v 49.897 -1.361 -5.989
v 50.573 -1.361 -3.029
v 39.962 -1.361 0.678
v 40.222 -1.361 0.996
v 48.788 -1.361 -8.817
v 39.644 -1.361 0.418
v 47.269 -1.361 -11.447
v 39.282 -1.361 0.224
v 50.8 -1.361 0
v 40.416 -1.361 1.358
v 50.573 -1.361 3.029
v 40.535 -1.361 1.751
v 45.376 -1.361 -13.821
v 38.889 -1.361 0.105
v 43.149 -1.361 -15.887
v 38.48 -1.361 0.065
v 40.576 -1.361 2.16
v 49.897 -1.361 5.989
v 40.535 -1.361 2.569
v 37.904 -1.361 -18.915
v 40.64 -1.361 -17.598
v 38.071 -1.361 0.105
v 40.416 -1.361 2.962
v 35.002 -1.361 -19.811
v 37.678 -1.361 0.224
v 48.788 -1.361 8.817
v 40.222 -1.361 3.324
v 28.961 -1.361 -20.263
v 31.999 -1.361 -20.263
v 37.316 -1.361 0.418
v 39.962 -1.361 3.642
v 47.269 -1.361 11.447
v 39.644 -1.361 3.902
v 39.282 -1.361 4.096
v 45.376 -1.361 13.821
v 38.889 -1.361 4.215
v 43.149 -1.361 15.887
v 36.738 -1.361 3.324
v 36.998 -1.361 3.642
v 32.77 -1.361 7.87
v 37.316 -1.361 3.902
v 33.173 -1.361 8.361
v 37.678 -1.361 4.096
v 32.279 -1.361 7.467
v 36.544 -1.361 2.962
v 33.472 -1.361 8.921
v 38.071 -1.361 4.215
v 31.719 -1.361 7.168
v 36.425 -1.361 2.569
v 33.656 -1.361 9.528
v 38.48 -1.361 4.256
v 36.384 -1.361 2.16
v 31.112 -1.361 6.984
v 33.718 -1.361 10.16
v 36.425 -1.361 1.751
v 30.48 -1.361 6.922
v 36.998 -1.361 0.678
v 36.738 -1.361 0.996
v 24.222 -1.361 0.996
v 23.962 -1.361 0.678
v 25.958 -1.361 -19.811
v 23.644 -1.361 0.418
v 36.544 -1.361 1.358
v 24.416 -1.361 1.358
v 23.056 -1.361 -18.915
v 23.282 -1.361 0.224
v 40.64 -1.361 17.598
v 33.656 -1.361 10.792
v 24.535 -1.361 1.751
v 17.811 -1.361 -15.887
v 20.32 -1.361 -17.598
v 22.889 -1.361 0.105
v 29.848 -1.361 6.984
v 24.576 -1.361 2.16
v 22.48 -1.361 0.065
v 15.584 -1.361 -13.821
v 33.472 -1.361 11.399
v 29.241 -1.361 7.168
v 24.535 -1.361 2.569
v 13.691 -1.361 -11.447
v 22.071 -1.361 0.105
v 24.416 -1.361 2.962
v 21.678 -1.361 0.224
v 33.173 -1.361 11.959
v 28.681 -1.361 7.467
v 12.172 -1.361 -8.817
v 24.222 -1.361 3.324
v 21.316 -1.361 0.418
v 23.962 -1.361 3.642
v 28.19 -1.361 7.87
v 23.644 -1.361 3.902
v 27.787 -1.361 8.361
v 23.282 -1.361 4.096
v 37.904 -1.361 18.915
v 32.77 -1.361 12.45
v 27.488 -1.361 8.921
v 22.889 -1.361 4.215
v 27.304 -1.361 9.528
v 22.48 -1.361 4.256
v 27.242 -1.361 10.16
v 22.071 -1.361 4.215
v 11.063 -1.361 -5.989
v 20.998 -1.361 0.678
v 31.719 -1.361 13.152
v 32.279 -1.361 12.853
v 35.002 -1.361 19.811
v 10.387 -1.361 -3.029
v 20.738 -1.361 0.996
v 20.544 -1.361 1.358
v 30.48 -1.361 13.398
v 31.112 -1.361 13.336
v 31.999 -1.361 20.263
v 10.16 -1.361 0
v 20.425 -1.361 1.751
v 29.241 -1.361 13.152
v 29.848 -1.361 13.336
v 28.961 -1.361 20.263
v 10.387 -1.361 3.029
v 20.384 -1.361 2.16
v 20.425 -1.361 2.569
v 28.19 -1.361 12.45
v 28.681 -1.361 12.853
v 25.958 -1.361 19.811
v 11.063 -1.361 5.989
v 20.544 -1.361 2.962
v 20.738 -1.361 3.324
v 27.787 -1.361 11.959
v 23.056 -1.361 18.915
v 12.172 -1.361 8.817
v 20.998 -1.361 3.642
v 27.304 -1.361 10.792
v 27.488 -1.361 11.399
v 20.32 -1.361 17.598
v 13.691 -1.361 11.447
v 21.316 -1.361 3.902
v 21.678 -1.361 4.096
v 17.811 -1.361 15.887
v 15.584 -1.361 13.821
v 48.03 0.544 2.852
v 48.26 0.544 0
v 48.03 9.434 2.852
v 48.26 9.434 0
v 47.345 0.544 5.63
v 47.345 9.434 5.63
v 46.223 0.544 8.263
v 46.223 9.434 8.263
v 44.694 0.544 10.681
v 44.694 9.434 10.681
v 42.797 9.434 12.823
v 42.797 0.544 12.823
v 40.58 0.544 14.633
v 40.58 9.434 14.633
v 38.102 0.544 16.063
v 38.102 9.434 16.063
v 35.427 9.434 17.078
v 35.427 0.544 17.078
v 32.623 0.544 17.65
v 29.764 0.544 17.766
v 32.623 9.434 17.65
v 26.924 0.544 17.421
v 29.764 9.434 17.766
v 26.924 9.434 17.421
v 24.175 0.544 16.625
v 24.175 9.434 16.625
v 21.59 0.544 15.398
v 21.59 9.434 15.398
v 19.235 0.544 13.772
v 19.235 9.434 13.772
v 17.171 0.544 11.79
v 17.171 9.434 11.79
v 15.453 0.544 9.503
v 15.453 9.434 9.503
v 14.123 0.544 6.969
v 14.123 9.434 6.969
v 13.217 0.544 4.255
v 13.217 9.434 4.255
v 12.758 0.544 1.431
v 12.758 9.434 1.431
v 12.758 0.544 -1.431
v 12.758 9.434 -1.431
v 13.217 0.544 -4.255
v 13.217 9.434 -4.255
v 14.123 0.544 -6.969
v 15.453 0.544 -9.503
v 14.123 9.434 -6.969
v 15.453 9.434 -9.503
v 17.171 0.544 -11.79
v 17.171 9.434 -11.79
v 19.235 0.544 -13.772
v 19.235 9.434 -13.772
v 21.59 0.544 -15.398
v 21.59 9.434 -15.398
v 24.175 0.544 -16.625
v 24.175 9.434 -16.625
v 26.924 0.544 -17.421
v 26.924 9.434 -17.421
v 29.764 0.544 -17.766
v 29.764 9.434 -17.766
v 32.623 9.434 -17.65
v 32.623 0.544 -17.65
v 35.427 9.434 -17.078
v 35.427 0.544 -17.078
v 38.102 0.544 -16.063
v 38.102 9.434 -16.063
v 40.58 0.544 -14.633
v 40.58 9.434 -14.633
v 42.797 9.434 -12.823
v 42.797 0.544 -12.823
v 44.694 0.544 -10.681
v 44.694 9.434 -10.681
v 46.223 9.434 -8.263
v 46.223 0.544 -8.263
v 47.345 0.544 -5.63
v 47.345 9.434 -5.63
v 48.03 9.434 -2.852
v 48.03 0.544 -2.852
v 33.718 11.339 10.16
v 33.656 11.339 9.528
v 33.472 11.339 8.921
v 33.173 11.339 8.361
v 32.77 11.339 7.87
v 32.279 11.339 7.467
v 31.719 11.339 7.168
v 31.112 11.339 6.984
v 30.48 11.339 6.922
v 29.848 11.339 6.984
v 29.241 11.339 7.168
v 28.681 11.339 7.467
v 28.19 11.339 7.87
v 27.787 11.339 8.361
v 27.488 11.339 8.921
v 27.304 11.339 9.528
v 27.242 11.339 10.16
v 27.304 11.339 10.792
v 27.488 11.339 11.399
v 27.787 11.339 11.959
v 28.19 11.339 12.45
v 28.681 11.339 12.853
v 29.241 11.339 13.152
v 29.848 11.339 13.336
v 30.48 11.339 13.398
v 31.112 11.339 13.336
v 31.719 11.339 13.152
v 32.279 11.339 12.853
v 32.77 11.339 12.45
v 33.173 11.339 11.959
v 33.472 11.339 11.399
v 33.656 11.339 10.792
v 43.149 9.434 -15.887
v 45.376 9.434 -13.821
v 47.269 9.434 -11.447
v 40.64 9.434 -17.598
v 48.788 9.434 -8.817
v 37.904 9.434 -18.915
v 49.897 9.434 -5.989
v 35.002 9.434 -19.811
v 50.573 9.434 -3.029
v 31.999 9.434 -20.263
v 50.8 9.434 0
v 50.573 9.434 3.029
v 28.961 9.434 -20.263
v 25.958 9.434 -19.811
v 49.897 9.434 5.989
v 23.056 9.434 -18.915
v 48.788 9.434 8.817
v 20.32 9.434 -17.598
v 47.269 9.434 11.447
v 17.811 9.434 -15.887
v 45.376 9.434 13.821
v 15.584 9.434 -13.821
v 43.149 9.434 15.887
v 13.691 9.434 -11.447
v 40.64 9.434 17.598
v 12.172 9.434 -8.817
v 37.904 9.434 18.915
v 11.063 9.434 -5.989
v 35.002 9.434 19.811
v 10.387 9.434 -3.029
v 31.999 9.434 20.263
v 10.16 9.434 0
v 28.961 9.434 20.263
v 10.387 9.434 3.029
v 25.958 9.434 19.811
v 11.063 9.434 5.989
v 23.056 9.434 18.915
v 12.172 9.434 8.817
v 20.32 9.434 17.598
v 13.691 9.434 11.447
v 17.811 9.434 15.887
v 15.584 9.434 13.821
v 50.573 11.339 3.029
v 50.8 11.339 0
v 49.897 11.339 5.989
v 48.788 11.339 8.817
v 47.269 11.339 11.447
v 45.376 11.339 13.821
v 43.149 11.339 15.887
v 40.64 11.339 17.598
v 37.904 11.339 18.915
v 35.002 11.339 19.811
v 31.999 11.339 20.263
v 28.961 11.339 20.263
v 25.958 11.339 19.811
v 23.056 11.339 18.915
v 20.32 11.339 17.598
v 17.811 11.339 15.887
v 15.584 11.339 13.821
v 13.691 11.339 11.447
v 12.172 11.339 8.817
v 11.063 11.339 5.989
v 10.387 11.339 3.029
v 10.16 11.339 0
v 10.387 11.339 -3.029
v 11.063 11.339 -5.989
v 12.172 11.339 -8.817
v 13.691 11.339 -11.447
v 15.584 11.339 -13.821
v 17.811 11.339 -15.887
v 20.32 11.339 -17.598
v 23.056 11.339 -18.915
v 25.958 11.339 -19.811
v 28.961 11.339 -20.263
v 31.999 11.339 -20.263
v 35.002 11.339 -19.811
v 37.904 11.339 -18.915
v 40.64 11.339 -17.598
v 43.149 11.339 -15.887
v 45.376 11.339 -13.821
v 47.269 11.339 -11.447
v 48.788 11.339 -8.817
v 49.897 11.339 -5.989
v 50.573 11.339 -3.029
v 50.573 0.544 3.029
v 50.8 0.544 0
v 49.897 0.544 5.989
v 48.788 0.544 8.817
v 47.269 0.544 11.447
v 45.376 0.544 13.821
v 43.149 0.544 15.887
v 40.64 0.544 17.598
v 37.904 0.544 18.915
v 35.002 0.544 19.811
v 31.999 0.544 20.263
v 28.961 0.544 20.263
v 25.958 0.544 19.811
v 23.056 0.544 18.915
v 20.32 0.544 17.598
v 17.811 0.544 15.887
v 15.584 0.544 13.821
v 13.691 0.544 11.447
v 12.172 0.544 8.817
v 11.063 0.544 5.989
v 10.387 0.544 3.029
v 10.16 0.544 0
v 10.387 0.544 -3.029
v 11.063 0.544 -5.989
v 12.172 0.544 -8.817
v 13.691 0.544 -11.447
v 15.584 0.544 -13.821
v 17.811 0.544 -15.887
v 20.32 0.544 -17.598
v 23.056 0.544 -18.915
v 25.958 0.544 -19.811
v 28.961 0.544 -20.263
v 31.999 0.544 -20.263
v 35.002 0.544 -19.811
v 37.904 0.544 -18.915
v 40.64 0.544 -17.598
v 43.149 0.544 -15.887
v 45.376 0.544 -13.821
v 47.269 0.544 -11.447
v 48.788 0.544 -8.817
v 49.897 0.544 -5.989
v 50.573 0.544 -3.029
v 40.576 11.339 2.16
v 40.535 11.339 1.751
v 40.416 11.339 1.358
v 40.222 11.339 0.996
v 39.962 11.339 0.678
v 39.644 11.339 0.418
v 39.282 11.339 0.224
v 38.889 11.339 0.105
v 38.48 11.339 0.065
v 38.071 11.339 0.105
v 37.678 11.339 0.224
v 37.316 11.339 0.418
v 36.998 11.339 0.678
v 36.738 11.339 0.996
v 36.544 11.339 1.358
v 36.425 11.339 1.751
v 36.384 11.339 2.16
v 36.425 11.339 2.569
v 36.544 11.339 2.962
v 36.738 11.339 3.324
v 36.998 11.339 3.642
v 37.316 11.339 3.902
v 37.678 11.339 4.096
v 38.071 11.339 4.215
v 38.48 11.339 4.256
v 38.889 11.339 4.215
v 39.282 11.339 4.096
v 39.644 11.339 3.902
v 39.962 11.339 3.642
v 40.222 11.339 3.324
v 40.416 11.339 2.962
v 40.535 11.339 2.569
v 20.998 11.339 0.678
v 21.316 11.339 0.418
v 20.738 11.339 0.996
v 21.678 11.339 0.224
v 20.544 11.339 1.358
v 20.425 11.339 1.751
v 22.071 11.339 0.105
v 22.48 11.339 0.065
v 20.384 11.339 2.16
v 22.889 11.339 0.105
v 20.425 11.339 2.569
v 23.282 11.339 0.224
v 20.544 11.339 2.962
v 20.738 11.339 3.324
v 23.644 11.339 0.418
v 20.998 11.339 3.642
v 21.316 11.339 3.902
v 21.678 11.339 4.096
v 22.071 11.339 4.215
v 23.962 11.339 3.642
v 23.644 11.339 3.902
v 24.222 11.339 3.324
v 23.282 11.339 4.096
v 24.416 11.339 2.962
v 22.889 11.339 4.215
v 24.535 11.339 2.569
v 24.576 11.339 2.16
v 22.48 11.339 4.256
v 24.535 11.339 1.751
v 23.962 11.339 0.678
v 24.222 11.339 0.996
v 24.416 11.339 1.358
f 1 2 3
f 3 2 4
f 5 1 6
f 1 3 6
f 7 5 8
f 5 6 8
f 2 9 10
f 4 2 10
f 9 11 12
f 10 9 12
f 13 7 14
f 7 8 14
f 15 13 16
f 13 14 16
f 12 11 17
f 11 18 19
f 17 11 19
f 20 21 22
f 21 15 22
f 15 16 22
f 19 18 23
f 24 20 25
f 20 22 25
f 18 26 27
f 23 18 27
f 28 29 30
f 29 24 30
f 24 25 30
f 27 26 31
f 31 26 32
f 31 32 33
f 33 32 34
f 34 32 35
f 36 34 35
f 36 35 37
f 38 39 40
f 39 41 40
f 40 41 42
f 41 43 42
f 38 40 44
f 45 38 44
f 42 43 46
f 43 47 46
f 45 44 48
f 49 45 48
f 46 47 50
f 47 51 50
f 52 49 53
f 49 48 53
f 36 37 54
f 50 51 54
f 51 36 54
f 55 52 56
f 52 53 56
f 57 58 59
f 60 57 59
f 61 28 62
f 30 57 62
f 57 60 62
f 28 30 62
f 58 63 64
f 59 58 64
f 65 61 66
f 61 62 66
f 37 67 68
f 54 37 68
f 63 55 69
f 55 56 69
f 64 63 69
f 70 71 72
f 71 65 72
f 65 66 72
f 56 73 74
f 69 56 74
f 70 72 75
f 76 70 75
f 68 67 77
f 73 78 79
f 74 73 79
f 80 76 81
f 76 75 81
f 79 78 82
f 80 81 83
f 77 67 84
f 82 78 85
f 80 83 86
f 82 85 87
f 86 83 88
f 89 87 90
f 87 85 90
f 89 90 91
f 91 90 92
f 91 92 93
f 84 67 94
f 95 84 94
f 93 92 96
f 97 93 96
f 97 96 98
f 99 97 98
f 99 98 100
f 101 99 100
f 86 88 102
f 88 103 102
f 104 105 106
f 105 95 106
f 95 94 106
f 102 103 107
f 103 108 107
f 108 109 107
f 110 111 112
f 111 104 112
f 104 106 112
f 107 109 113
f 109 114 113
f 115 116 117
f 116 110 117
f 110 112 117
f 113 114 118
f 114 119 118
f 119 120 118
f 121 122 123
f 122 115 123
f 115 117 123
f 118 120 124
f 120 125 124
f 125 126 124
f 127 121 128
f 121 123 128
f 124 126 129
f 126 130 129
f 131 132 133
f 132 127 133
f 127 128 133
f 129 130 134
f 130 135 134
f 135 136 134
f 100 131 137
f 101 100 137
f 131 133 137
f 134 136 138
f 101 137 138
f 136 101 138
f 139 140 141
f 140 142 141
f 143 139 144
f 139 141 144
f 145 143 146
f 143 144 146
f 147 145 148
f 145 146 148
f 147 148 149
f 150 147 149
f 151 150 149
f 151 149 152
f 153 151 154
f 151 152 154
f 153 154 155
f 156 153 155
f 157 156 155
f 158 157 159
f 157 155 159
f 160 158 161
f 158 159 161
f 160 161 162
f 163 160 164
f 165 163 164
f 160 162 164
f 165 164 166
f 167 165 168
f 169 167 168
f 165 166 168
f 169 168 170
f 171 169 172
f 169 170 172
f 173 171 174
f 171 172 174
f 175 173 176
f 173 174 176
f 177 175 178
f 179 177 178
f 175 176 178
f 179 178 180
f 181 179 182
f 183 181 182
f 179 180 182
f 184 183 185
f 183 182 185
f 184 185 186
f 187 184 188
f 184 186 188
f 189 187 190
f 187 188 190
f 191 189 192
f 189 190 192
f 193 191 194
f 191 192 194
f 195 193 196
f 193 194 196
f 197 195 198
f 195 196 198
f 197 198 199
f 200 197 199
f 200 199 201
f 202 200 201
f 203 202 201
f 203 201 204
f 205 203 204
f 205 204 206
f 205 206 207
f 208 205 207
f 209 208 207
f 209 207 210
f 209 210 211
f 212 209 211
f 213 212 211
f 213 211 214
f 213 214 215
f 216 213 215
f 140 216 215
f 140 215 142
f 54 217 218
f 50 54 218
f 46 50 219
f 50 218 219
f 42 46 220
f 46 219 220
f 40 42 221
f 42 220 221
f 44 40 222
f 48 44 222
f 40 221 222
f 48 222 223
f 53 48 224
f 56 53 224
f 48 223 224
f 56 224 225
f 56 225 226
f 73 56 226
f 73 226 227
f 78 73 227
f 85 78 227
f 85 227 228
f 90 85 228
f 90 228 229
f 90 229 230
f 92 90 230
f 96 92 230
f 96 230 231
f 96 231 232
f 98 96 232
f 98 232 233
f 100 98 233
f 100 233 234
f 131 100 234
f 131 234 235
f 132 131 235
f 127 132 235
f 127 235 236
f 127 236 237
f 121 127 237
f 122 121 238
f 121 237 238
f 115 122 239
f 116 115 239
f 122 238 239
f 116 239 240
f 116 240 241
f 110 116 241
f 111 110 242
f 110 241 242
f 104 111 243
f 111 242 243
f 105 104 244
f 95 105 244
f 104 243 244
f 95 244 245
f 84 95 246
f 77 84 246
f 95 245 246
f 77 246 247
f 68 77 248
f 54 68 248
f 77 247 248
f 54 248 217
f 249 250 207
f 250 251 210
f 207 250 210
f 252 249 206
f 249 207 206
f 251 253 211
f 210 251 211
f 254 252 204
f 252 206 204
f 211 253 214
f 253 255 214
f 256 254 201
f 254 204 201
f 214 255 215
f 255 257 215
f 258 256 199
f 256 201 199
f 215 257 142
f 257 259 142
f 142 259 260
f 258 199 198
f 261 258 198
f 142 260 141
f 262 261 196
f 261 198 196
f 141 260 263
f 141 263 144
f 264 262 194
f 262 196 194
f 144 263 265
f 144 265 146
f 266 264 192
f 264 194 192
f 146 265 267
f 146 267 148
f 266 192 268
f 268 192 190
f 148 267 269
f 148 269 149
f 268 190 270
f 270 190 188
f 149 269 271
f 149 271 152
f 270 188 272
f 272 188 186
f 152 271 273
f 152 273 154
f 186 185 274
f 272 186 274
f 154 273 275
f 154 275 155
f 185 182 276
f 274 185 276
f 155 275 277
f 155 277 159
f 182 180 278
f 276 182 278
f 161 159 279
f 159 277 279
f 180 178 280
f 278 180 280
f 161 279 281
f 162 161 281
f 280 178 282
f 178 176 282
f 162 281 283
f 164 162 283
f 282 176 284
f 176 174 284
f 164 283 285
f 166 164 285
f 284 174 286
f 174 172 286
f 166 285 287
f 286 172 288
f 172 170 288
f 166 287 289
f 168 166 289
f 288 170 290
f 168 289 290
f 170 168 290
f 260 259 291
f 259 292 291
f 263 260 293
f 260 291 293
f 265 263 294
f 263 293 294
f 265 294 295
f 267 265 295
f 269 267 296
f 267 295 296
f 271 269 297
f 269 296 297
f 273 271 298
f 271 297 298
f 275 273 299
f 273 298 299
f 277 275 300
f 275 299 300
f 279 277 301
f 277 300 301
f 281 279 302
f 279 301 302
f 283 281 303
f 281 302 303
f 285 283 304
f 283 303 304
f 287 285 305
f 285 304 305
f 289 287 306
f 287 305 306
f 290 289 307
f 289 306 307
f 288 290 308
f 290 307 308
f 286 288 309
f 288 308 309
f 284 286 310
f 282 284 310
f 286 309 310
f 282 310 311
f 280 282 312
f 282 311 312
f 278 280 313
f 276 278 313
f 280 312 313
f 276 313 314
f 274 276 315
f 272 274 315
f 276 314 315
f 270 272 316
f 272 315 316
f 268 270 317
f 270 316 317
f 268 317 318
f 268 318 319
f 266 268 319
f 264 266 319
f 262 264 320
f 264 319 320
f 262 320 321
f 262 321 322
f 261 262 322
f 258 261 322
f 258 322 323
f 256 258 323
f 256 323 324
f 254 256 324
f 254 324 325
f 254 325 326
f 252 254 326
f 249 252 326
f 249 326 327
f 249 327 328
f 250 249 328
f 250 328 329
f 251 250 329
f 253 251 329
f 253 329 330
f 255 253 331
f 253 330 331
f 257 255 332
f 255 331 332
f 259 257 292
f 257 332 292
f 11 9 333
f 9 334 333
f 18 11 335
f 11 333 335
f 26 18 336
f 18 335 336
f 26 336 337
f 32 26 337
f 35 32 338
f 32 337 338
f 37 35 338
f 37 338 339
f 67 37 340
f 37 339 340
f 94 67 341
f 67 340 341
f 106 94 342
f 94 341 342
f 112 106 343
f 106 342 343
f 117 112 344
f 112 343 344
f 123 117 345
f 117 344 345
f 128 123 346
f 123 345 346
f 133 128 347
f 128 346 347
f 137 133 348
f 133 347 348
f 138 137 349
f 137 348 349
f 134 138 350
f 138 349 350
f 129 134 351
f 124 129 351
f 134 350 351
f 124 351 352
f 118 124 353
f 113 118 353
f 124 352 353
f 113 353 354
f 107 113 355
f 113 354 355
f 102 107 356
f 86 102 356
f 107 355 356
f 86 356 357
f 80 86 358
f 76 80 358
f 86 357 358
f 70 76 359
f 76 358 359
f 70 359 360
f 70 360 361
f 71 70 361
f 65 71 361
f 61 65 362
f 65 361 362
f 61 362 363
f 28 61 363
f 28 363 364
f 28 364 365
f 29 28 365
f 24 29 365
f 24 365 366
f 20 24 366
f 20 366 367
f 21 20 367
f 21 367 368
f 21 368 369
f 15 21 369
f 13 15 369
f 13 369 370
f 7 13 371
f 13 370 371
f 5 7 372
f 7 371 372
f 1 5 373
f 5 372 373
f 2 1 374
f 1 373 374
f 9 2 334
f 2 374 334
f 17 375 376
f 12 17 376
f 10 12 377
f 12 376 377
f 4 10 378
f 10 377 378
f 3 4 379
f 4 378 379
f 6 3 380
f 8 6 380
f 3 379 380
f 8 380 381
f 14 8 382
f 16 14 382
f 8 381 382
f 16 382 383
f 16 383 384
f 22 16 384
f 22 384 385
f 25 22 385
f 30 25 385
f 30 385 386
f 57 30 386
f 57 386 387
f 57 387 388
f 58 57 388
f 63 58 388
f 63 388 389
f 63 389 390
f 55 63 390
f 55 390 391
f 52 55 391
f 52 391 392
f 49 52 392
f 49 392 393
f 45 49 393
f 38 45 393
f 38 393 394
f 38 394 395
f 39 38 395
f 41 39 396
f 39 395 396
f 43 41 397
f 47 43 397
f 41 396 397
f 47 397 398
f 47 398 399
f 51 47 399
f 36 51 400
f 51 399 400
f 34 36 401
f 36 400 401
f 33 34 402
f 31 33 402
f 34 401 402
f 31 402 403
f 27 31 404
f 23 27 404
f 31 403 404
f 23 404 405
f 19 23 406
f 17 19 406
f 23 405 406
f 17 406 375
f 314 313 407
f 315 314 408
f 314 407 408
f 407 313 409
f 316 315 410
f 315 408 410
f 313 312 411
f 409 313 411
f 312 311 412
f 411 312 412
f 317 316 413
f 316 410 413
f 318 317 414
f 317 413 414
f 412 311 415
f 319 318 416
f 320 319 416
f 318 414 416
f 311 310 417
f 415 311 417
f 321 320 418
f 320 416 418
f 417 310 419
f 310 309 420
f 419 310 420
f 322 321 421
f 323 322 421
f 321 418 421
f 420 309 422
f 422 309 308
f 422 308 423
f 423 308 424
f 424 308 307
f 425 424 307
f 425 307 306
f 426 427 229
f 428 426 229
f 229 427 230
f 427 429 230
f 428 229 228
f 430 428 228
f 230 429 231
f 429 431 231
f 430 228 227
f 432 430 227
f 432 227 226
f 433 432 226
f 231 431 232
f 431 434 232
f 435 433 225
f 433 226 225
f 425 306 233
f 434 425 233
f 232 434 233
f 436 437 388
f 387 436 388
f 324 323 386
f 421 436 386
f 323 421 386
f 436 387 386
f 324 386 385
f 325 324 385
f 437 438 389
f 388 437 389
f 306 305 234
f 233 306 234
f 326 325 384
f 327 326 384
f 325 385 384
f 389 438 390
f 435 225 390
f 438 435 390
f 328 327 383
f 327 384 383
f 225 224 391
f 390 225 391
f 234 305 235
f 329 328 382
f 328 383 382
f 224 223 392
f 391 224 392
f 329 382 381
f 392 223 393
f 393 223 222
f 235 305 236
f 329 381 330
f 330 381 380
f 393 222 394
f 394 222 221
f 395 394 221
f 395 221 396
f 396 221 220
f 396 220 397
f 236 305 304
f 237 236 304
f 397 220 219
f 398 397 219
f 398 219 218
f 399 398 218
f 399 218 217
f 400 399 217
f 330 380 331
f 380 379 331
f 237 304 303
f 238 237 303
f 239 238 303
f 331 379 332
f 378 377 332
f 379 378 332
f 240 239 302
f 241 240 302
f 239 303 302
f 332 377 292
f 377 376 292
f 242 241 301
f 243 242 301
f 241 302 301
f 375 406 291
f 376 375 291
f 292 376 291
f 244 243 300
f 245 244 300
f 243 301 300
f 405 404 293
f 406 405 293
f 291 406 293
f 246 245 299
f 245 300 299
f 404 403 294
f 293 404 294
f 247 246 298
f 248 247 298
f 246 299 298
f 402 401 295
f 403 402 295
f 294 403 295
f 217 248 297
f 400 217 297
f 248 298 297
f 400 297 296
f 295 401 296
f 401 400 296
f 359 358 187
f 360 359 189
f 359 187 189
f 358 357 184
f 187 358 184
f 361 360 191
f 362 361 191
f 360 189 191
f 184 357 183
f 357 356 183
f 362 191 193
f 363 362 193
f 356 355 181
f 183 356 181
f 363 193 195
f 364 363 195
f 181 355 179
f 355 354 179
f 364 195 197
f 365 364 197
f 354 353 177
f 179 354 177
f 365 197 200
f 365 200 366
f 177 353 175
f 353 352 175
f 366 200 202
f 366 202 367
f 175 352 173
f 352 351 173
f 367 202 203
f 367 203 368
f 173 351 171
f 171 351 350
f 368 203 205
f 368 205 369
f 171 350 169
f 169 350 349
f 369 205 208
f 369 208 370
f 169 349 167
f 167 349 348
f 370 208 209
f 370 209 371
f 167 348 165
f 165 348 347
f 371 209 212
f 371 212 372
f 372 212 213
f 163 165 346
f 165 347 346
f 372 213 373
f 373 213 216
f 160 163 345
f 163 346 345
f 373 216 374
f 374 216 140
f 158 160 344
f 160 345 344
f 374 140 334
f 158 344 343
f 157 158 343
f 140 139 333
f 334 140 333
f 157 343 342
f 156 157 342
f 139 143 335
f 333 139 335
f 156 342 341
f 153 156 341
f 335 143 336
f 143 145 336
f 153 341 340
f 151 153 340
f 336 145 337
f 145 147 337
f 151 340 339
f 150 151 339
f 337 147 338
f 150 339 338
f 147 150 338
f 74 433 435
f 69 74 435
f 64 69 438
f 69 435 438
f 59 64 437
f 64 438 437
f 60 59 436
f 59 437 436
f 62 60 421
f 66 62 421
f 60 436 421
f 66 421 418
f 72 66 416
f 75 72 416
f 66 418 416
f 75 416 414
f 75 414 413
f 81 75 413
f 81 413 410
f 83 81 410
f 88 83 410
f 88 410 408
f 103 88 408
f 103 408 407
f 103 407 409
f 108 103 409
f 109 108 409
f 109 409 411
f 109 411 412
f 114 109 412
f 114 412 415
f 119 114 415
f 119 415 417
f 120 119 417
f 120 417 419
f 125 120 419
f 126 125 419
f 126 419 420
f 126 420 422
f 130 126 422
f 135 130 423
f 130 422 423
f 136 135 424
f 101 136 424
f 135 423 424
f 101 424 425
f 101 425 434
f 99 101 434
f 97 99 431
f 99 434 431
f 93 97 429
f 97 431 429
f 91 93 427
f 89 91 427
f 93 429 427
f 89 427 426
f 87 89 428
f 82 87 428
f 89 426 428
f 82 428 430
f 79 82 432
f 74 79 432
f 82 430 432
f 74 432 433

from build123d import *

# Parameters (mm, degrees)
SKETCH4_R          = 3.2385
SKETCH4_R_2        = 2.0955
CUT_EXTRUDE1_DEPTH = 13.7


with BuildPart() as part:
    # Sketch3 → Revolve1 (revolve)
    with BuildSketch(Plane.XY):
        Polygon((30.48, -1.361443582), (50.8, -1.361443582), (50.8, 0.543556418), (48.26, 0.543556418), (48.26, 9.433556418), (50.8, 9.433556418), (50.8, 11.338556418), (30.48, 11.338556418), align=None)
    revolve(axis=Axis((30.48, 11.338556418, 0), (0, -1, 0)))

    # Sketch4 → Cut-Extrude1 (cut, through all)
    with BuildSketch(Plane(origin=(0, 11.338556418, 0), x_dir=(1, 0, 0), z_dir=(0, 1, 0))):
        with Locations((30.48, -10.16)):
            Circle(SKETCH4_R)
        with Locations((22.48, -2.16)):
            Circle(SKETCH4_R_2)
        with Locations((38.48, -2.16)):
            Circle(SKETCH4_R_2)
    extrude(amount=-CUT_EXTRUDE1_DEPTH, mode=Mode.SUBTRACT)


solid = part.part
